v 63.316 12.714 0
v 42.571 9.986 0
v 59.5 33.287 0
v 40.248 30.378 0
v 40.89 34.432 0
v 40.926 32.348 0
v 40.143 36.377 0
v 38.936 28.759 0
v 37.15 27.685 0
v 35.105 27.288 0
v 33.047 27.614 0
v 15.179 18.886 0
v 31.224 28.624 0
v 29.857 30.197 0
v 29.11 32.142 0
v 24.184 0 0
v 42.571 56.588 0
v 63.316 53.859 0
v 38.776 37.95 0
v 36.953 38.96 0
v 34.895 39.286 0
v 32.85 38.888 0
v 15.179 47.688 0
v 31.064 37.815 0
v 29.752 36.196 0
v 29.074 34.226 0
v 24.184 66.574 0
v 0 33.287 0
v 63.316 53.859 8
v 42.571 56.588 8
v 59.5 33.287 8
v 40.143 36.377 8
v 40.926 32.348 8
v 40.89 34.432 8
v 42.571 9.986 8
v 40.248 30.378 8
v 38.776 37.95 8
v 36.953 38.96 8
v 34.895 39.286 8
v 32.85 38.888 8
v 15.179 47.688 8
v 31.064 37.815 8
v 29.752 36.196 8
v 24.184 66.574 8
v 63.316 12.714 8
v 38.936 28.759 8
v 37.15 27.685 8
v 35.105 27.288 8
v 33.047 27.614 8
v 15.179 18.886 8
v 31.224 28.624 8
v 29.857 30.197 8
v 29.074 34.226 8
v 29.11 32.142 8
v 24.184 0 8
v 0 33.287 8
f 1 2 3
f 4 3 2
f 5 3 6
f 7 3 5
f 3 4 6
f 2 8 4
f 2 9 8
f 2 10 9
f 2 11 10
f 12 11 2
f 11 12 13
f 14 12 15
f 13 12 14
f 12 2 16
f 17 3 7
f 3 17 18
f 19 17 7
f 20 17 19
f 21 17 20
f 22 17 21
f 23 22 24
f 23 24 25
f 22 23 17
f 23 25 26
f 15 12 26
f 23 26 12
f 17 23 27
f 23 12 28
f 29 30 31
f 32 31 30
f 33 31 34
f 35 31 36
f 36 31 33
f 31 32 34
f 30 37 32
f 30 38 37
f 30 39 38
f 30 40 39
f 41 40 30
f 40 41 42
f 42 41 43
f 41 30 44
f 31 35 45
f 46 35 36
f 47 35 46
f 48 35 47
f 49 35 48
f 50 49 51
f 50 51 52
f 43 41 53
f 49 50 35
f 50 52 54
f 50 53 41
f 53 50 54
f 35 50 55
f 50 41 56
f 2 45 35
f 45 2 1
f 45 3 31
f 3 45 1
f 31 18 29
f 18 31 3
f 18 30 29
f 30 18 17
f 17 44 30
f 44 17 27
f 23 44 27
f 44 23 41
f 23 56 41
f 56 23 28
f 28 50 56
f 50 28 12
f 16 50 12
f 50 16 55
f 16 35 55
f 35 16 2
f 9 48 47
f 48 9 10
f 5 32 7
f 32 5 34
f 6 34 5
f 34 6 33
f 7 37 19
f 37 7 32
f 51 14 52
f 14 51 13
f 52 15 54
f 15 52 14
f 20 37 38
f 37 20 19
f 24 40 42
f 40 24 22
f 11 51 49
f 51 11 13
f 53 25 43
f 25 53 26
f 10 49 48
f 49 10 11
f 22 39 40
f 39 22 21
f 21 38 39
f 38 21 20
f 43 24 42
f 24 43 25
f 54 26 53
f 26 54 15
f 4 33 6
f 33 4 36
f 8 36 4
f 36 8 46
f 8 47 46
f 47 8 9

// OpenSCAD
$fn = 32;

// ----------------------------------------------------------------------
// Star wheel: 5-point blunt, R35
// ----------------------------------------------------------------------

// --- parameters (mm) ---
n_points = 5;             // number of points / teeth
r_out = 35;               // tip radius
r_in = 24.5;              // root radius
bore_r = 6;               // centre bore radius
plate_t = 8;              // plate thickness, Z (extrusion height)
bore_d = 12;              // centre bore diameter

profile = [[0, 33.287], [15.179, 18.886], [24.184, 0], [42.571, 9.986], [63.316, 12.714], [59.5, 33.287], [63.316, 53.859], [42.571, 56.588], [24.184, 66.574], [15.179, 47.688]];  // primary outline, 10 points, counter clockwise
void_1 = [[40.89, 34.432], [40.143, 36.377], [38.776, 37.95], [36.953, 38.96], [34.895, 39.286], [32.85, 38.888], [31.064, 37.815], [29.752, 36.196], [29.074, 34.226], [29.11, 32.142], [29.857, 30.197], [31.224, 28.624], [33.047, 27.614], [35.105, 27.288], [37.15, 27.685], [38.936, 28.759], [40.248, 30.378], [40.926, 32.348]];  // centre bore, 18 points

// --- the one profile operation ---
difference() {
  linear_extrude(height = plate_t) polygon(points = profile);
  translate([0, 0, -1])
    linear_extrude(height = plate_t + 2) polygon(points = void_1);
}
